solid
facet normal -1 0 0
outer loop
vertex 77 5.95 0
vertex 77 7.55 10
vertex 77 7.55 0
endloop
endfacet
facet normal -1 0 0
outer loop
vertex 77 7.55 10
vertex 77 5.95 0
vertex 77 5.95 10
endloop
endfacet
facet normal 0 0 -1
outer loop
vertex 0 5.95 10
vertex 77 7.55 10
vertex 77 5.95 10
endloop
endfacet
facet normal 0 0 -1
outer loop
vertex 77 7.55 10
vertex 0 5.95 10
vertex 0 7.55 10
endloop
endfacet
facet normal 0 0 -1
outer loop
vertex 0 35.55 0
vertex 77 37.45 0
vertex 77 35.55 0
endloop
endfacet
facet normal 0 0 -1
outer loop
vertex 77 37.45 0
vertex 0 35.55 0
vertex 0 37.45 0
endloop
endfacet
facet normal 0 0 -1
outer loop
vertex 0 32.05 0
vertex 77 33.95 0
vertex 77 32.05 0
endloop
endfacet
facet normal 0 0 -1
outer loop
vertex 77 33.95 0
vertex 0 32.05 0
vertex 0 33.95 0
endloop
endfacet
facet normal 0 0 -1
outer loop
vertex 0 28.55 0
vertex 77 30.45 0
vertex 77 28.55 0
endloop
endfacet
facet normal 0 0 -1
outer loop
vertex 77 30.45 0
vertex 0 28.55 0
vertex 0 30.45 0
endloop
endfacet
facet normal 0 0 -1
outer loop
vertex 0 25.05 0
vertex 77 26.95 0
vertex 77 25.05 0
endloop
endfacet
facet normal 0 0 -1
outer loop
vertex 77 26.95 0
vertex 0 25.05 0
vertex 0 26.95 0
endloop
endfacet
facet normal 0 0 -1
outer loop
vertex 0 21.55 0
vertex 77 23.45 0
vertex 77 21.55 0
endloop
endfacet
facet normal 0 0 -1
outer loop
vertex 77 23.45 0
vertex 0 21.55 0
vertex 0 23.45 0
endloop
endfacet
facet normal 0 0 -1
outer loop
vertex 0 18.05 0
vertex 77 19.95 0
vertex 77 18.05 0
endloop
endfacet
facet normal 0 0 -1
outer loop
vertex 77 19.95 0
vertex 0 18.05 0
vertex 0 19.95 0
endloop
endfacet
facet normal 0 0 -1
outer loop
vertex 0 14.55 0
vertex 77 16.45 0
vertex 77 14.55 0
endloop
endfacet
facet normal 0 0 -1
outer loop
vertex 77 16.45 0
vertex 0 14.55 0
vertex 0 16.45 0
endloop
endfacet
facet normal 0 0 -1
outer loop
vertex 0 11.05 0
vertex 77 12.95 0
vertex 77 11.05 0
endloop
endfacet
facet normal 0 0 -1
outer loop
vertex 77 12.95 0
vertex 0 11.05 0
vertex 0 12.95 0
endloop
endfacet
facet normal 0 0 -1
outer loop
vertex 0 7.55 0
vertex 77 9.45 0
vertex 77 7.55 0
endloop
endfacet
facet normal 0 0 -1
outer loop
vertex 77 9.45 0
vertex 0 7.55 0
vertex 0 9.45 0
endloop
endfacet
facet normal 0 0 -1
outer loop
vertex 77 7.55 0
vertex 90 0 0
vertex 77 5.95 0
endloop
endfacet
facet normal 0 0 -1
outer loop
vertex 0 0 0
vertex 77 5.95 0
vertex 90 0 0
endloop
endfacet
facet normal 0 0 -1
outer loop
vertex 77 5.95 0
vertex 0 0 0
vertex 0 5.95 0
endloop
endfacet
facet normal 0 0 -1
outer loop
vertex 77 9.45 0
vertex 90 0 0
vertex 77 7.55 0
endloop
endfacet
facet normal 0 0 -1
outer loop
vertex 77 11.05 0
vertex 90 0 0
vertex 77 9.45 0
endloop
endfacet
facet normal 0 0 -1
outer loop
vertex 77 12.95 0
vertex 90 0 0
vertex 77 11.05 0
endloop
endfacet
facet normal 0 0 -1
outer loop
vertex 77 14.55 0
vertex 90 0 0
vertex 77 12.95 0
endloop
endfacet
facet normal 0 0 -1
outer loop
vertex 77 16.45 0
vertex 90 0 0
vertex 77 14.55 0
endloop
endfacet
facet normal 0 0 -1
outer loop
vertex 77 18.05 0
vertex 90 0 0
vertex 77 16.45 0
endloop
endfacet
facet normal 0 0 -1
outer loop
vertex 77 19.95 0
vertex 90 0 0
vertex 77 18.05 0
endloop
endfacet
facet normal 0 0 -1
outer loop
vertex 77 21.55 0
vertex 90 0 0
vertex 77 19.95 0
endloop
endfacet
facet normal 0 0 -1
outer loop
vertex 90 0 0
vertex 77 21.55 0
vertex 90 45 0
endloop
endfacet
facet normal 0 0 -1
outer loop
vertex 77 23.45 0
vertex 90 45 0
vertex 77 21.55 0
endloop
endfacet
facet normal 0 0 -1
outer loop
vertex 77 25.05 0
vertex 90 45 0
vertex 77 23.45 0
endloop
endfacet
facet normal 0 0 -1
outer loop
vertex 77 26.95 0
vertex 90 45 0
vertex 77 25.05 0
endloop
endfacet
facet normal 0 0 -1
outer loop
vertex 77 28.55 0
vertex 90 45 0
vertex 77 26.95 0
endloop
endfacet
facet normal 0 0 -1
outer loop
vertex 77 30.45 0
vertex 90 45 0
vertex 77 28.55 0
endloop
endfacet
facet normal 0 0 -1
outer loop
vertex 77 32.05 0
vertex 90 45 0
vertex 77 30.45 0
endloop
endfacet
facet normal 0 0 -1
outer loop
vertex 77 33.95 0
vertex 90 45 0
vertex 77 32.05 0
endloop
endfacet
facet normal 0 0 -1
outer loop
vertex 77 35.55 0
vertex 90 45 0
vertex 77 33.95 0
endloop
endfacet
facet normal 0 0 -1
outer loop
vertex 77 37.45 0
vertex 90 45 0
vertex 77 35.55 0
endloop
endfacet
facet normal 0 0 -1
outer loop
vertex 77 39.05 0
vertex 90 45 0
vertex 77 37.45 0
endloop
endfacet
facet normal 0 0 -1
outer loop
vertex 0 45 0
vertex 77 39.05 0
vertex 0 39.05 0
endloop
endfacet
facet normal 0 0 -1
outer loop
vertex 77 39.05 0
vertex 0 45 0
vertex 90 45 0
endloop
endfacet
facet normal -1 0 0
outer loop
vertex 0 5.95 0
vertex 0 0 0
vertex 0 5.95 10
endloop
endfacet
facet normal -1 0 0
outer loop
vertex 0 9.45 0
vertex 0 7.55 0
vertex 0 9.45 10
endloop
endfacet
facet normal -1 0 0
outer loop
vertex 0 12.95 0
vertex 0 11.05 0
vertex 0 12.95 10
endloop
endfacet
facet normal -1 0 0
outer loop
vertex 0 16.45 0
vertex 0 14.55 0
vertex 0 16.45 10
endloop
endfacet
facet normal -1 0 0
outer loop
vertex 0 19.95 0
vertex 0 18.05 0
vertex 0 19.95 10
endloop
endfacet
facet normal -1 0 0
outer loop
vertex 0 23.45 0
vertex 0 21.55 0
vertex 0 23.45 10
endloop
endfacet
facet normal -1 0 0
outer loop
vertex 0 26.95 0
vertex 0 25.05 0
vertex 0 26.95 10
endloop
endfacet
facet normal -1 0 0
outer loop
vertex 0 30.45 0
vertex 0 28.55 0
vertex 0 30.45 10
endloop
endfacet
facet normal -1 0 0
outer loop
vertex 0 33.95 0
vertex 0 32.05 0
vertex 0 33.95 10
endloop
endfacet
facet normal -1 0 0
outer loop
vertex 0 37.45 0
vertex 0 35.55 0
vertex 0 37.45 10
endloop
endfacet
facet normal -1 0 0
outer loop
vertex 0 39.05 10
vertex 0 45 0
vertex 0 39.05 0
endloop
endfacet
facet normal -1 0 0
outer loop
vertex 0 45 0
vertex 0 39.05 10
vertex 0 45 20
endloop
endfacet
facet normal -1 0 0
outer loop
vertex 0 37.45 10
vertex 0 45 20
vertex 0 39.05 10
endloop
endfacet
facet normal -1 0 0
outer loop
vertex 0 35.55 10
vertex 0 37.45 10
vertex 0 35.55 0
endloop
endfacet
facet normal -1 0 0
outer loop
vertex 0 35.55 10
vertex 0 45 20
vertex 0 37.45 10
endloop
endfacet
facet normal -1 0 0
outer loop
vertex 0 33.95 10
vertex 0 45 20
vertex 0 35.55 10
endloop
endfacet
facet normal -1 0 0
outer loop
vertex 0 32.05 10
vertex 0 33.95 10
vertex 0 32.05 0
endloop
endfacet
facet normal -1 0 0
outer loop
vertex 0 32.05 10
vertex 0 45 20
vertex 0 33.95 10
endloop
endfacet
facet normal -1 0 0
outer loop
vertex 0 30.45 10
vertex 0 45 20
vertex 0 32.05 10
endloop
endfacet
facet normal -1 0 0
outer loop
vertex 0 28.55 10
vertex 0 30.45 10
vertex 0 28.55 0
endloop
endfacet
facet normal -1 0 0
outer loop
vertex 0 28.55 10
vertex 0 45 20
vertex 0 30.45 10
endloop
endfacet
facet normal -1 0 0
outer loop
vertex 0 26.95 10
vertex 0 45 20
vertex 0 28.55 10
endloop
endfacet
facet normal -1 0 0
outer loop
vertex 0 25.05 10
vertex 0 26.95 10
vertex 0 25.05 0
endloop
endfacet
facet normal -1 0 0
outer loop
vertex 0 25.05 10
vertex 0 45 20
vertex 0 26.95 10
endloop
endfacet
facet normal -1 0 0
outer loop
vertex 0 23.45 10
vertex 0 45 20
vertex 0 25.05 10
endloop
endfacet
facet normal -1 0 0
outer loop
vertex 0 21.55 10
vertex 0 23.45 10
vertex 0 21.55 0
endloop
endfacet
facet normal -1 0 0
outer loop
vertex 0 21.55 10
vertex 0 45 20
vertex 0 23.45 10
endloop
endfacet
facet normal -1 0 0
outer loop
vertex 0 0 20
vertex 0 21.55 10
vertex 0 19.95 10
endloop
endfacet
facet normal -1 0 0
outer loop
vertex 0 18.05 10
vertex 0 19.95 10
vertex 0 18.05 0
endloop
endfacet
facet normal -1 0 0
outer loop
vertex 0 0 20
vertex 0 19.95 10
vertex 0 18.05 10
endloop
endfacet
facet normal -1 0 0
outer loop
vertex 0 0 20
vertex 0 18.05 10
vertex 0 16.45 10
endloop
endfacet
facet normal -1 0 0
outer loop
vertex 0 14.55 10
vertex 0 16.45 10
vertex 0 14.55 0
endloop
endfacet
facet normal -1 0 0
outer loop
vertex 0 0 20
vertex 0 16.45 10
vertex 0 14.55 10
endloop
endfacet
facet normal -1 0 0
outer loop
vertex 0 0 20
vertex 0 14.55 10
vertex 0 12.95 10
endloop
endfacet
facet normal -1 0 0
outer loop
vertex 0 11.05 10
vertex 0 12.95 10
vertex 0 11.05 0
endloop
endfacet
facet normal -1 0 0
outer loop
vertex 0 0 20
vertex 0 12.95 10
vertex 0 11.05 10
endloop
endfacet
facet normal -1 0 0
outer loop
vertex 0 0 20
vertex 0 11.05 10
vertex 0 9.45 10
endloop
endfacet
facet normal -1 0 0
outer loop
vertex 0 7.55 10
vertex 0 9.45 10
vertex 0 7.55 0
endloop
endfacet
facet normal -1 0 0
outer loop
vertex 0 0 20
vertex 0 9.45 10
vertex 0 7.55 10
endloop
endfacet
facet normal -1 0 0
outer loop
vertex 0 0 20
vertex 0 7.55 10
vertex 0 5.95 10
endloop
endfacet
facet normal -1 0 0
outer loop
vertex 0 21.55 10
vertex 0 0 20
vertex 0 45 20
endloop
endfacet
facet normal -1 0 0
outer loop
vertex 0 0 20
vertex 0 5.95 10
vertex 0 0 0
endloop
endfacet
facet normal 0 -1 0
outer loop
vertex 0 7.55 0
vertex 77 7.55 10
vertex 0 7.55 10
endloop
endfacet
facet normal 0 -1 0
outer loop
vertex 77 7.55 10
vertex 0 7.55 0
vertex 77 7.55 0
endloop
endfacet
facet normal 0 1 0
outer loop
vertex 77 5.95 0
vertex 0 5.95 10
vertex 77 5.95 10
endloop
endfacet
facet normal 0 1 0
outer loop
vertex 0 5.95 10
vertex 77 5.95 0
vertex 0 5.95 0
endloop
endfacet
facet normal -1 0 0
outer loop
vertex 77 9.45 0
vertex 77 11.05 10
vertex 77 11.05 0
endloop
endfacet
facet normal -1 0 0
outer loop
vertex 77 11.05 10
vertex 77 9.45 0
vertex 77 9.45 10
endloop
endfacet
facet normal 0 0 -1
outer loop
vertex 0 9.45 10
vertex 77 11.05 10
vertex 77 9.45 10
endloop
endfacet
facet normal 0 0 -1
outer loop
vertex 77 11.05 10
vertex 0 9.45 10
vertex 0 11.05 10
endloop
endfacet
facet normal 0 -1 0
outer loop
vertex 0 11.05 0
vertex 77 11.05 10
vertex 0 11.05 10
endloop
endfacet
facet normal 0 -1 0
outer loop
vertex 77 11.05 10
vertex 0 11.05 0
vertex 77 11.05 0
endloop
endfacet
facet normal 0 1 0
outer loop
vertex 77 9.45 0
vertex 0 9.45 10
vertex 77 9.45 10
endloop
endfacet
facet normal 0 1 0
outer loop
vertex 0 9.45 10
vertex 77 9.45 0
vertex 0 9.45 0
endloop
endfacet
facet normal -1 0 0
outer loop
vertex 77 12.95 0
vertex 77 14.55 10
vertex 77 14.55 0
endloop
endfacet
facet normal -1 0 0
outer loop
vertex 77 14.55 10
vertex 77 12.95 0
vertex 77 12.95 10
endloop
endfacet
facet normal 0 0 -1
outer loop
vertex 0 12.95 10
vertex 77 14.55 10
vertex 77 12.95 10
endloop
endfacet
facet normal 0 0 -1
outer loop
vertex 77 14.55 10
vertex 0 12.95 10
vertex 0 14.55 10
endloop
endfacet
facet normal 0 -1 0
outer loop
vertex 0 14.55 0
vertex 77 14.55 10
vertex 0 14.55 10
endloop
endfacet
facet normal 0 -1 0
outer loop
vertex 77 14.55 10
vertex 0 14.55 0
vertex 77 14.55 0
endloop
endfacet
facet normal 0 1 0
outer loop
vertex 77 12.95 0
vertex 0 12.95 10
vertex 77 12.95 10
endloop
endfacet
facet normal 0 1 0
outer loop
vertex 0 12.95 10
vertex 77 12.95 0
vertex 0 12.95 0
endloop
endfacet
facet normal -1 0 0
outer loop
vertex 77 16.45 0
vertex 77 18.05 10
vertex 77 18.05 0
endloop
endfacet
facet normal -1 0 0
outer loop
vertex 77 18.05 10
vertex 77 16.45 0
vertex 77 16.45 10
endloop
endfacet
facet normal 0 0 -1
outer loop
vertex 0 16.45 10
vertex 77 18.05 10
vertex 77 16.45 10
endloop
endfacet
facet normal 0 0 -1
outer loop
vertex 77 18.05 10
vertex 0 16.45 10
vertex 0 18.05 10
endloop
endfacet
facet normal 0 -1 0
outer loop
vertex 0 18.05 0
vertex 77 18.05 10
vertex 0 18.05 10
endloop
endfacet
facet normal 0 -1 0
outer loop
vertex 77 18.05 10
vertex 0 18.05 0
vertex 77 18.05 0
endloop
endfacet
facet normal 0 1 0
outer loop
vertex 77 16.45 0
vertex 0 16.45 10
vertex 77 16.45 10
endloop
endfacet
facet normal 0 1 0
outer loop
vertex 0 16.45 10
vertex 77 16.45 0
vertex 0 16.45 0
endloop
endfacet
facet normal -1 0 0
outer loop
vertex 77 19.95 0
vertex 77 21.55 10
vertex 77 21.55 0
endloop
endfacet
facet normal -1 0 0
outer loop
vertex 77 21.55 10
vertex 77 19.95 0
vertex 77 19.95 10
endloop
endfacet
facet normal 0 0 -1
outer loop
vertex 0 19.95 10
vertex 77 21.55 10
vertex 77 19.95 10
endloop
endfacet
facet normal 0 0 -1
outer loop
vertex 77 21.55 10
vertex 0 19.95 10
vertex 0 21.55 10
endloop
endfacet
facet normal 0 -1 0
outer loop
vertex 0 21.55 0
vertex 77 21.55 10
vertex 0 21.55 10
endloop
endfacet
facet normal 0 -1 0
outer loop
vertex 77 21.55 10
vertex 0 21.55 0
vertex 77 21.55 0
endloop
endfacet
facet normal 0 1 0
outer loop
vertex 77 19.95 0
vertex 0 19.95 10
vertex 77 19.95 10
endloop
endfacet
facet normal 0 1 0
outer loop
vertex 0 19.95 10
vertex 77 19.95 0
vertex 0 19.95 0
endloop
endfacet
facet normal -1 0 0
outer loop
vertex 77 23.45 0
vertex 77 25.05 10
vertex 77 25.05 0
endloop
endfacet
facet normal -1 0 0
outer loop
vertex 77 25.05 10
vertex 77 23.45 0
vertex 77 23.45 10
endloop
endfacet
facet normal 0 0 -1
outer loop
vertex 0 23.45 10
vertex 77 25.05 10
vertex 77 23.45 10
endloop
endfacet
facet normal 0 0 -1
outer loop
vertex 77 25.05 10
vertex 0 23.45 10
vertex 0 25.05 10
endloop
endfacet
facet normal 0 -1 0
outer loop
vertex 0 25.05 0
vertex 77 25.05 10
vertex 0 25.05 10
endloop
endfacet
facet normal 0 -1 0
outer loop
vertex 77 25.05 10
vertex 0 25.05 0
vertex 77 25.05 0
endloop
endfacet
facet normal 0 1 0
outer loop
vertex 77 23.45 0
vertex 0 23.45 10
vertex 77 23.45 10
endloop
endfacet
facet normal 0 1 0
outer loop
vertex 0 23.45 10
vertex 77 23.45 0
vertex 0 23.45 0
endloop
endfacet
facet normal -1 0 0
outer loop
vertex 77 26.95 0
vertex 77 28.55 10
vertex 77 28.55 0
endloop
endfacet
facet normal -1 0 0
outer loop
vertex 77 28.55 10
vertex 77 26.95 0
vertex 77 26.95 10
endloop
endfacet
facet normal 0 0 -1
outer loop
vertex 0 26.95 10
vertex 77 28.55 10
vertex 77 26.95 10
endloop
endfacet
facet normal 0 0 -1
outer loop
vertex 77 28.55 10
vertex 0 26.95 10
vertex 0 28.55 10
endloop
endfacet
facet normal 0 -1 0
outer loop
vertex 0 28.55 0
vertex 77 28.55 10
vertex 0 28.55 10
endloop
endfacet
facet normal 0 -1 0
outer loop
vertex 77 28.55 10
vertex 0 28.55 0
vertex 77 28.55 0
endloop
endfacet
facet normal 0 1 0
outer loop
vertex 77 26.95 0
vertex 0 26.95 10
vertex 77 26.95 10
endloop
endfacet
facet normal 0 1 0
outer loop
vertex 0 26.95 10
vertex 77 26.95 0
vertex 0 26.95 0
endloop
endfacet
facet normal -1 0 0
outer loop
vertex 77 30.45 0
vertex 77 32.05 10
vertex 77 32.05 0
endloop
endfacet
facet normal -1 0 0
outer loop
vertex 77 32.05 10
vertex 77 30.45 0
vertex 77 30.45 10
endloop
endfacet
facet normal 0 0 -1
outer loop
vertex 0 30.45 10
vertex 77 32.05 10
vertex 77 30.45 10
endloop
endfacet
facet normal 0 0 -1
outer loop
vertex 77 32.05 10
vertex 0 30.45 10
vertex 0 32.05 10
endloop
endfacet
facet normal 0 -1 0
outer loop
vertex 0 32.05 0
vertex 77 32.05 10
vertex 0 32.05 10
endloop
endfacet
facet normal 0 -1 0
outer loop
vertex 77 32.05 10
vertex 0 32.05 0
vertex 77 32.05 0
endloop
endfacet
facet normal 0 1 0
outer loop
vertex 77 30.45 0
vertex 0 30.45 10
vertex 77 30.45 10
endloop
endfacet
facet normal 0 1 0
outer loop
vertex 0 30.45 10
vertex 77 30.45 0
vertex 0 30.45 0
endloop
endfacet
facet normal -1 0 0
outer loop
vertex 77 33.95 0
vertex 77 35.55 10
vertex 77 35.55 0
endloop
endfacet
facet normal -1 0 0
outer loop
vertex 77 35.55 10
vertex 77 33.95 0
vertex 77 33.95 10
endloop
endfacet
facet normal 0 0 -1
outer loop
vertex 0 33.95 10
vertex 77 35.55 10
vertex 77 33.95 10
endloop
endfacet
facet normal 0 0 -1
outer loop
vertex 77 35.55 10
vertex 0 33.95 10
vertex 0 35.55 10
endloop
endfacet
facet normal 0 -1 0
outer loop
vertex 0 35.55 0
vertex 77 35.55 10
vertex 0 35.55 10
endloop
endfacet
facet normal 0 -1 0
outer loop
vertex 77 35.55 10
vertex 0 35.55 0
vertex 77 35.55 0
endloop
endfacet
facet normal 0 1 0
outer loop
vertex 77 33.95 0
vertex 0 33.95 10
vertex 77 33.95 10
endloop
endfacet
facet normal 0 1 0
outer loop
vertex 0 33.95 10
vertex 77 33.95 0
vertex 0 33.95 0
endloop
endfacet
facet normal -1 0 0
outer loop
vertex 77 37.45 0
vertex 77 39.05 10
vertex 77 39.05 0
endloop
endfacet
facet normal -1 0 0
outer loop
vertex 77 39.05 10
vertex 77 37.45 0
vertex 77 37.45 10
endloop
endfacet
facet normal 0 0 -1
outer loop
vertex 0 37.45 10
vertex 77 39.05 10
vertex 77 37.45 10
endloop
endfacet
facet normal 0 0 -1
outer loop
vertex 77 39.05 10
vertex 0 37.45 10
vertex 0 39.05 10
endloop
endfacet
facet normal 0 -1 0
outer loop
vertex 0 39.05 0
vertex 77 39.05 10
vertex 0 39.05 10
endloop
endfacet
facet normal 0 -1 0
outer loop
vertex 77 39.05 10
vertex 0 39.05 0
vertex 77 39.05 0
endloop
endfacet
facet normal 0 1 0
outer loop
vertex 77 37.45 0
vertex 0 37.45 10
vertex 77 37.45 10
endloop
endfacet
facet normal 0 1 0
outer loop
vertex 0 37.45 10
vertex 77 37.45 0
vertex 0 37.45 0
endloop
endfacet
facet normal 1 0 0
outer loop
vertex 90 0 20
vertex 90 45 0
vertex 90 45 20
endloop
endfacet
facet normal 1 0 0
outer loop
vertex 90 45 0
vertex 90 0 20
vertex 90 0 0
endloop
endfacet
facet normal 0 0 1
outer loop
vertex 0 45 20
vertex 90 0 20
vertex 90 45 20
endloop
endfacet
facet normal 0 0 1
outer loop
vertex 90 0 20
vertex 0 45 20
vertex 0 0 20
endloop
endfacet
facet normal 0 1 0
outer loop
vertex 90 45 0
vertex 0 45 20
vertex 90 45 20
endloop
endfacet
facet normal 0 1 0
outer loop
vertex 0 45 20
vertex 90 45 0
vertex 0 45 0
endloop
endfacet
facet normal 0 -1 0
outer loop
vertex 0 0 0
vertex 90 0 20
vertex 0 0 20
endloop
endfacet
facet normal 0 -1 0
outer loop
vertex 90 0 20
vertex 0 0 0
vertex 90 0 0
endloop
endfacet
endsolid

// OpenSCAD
$fn = 64;

block_length = 90;
block_width = 45;
block_height = 20;
slot_length = 77;
slot_width = 1.6;
slot_depth = 10;
slot_spacing = 3.5;
n = 10;

total_span = (slot_spacing * (n - 1)) + slot_width;
start_y = (block_width - total_span) / 2;

difference() {
    cube([block_length, block_width, block_height]);
    for (i = [0:n-1]) {
        translate([0, start_y + i * slot_spacing, 0])
        cube([slot_length, slot_width, slot_depth]);
    }
}
